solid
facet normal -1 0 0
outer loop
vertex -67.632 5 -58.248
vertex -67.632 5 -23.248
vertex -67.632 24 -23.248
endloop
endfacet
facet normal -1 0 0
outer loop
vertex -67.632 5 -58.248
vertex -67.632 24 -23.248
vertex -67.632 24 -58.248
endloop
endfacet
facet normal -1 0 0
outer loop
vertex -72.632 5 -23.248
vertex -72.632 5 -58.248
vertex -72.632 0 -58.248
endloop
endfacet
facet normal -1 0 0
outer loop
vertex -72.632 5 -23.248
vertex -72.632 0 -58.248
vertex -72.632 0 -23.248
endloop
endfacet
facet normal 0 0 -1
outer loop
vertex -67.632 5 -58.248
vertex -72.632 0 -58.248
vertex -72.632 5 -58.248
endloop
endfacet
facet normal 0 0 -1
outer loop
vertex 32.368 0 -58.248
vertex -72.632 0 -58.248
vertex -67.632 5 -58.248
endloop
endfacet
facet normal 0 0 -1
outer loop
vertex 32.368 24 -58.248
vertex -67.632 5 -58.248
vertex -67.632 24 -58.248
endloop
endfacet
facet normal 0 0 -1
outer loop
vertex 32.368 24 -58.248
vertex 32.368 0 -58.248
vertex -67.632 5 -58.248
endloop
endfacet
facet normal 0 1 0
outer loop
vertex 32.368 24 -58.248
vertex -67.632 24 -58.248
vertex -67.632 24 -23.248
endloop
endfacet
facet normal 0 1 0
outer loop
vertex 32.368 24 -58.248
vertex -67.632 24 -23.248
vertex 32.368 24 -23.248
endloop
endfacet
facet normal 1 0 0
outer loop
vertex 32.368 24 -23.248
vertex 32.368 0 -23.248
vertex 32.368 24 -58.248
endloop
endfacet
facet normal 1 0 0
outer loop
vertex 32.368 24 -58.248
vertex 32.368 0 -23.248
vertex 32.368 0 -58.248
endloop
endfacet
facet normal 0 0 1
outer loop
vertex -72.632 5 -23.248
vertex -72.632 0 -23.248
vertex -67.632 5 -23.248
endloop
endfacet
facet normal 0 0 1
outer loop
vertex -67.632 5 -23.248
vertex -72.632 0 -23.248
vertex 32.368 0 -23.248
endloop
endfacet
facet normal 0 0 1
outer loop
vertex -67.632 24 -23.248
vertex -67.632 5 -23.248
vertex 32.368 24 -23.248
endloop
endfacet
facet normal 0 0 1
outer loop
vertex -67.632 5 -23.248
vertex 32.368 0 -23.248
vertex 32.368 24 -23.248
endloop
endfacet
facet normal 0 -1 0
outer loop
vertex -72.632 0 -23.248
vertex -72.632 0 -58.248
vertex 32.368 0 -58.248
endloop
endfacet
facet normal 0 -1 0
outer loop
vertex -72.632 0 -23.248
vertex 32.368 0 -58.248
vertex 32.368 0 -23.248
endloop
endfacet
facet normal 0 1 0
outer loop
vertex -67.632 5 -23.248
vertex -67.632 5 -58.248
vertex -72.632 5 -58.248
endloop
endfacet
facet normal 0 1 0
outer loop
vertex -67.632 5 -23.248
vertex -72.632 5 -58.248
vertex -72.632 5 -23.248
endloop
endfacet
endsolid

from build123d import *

# Parameters (mm, degrees)
SKETCH1_W      = 100
SKETCH1_H      = 35
EXTRUDE1_DEPTH = 24
SKETCH2_W      = 35
SKETCH2_H      = 5
EXTRUDE2_DEPTH = 5


with BuildPart() as part:
    # Sketch1 → Extrude1 (new body)
    with BuildSketch(Plane(origin=(0, 0, 0), x_dir=(1, 0, 0), z_dir=(0, 1, 0))):
        with Locations((-17.631525754, 40.747794601)):
            Rectangle(SKETCH1_W, SKETCH1_H)
    extrude(amount=EXTRUDE1_DEPTH)

    # Sketch2 → Extrude2 (add)
    with BuildSketch(Plane.ZY.offset(67.631525754)):
        with Locations((-40.747794601, 2.5)):
            Rectangle(SKETCH2_W, SKETCH2_H)
    extrude(amount=EXTRUDE2_DEPTH)


solid = part.part
